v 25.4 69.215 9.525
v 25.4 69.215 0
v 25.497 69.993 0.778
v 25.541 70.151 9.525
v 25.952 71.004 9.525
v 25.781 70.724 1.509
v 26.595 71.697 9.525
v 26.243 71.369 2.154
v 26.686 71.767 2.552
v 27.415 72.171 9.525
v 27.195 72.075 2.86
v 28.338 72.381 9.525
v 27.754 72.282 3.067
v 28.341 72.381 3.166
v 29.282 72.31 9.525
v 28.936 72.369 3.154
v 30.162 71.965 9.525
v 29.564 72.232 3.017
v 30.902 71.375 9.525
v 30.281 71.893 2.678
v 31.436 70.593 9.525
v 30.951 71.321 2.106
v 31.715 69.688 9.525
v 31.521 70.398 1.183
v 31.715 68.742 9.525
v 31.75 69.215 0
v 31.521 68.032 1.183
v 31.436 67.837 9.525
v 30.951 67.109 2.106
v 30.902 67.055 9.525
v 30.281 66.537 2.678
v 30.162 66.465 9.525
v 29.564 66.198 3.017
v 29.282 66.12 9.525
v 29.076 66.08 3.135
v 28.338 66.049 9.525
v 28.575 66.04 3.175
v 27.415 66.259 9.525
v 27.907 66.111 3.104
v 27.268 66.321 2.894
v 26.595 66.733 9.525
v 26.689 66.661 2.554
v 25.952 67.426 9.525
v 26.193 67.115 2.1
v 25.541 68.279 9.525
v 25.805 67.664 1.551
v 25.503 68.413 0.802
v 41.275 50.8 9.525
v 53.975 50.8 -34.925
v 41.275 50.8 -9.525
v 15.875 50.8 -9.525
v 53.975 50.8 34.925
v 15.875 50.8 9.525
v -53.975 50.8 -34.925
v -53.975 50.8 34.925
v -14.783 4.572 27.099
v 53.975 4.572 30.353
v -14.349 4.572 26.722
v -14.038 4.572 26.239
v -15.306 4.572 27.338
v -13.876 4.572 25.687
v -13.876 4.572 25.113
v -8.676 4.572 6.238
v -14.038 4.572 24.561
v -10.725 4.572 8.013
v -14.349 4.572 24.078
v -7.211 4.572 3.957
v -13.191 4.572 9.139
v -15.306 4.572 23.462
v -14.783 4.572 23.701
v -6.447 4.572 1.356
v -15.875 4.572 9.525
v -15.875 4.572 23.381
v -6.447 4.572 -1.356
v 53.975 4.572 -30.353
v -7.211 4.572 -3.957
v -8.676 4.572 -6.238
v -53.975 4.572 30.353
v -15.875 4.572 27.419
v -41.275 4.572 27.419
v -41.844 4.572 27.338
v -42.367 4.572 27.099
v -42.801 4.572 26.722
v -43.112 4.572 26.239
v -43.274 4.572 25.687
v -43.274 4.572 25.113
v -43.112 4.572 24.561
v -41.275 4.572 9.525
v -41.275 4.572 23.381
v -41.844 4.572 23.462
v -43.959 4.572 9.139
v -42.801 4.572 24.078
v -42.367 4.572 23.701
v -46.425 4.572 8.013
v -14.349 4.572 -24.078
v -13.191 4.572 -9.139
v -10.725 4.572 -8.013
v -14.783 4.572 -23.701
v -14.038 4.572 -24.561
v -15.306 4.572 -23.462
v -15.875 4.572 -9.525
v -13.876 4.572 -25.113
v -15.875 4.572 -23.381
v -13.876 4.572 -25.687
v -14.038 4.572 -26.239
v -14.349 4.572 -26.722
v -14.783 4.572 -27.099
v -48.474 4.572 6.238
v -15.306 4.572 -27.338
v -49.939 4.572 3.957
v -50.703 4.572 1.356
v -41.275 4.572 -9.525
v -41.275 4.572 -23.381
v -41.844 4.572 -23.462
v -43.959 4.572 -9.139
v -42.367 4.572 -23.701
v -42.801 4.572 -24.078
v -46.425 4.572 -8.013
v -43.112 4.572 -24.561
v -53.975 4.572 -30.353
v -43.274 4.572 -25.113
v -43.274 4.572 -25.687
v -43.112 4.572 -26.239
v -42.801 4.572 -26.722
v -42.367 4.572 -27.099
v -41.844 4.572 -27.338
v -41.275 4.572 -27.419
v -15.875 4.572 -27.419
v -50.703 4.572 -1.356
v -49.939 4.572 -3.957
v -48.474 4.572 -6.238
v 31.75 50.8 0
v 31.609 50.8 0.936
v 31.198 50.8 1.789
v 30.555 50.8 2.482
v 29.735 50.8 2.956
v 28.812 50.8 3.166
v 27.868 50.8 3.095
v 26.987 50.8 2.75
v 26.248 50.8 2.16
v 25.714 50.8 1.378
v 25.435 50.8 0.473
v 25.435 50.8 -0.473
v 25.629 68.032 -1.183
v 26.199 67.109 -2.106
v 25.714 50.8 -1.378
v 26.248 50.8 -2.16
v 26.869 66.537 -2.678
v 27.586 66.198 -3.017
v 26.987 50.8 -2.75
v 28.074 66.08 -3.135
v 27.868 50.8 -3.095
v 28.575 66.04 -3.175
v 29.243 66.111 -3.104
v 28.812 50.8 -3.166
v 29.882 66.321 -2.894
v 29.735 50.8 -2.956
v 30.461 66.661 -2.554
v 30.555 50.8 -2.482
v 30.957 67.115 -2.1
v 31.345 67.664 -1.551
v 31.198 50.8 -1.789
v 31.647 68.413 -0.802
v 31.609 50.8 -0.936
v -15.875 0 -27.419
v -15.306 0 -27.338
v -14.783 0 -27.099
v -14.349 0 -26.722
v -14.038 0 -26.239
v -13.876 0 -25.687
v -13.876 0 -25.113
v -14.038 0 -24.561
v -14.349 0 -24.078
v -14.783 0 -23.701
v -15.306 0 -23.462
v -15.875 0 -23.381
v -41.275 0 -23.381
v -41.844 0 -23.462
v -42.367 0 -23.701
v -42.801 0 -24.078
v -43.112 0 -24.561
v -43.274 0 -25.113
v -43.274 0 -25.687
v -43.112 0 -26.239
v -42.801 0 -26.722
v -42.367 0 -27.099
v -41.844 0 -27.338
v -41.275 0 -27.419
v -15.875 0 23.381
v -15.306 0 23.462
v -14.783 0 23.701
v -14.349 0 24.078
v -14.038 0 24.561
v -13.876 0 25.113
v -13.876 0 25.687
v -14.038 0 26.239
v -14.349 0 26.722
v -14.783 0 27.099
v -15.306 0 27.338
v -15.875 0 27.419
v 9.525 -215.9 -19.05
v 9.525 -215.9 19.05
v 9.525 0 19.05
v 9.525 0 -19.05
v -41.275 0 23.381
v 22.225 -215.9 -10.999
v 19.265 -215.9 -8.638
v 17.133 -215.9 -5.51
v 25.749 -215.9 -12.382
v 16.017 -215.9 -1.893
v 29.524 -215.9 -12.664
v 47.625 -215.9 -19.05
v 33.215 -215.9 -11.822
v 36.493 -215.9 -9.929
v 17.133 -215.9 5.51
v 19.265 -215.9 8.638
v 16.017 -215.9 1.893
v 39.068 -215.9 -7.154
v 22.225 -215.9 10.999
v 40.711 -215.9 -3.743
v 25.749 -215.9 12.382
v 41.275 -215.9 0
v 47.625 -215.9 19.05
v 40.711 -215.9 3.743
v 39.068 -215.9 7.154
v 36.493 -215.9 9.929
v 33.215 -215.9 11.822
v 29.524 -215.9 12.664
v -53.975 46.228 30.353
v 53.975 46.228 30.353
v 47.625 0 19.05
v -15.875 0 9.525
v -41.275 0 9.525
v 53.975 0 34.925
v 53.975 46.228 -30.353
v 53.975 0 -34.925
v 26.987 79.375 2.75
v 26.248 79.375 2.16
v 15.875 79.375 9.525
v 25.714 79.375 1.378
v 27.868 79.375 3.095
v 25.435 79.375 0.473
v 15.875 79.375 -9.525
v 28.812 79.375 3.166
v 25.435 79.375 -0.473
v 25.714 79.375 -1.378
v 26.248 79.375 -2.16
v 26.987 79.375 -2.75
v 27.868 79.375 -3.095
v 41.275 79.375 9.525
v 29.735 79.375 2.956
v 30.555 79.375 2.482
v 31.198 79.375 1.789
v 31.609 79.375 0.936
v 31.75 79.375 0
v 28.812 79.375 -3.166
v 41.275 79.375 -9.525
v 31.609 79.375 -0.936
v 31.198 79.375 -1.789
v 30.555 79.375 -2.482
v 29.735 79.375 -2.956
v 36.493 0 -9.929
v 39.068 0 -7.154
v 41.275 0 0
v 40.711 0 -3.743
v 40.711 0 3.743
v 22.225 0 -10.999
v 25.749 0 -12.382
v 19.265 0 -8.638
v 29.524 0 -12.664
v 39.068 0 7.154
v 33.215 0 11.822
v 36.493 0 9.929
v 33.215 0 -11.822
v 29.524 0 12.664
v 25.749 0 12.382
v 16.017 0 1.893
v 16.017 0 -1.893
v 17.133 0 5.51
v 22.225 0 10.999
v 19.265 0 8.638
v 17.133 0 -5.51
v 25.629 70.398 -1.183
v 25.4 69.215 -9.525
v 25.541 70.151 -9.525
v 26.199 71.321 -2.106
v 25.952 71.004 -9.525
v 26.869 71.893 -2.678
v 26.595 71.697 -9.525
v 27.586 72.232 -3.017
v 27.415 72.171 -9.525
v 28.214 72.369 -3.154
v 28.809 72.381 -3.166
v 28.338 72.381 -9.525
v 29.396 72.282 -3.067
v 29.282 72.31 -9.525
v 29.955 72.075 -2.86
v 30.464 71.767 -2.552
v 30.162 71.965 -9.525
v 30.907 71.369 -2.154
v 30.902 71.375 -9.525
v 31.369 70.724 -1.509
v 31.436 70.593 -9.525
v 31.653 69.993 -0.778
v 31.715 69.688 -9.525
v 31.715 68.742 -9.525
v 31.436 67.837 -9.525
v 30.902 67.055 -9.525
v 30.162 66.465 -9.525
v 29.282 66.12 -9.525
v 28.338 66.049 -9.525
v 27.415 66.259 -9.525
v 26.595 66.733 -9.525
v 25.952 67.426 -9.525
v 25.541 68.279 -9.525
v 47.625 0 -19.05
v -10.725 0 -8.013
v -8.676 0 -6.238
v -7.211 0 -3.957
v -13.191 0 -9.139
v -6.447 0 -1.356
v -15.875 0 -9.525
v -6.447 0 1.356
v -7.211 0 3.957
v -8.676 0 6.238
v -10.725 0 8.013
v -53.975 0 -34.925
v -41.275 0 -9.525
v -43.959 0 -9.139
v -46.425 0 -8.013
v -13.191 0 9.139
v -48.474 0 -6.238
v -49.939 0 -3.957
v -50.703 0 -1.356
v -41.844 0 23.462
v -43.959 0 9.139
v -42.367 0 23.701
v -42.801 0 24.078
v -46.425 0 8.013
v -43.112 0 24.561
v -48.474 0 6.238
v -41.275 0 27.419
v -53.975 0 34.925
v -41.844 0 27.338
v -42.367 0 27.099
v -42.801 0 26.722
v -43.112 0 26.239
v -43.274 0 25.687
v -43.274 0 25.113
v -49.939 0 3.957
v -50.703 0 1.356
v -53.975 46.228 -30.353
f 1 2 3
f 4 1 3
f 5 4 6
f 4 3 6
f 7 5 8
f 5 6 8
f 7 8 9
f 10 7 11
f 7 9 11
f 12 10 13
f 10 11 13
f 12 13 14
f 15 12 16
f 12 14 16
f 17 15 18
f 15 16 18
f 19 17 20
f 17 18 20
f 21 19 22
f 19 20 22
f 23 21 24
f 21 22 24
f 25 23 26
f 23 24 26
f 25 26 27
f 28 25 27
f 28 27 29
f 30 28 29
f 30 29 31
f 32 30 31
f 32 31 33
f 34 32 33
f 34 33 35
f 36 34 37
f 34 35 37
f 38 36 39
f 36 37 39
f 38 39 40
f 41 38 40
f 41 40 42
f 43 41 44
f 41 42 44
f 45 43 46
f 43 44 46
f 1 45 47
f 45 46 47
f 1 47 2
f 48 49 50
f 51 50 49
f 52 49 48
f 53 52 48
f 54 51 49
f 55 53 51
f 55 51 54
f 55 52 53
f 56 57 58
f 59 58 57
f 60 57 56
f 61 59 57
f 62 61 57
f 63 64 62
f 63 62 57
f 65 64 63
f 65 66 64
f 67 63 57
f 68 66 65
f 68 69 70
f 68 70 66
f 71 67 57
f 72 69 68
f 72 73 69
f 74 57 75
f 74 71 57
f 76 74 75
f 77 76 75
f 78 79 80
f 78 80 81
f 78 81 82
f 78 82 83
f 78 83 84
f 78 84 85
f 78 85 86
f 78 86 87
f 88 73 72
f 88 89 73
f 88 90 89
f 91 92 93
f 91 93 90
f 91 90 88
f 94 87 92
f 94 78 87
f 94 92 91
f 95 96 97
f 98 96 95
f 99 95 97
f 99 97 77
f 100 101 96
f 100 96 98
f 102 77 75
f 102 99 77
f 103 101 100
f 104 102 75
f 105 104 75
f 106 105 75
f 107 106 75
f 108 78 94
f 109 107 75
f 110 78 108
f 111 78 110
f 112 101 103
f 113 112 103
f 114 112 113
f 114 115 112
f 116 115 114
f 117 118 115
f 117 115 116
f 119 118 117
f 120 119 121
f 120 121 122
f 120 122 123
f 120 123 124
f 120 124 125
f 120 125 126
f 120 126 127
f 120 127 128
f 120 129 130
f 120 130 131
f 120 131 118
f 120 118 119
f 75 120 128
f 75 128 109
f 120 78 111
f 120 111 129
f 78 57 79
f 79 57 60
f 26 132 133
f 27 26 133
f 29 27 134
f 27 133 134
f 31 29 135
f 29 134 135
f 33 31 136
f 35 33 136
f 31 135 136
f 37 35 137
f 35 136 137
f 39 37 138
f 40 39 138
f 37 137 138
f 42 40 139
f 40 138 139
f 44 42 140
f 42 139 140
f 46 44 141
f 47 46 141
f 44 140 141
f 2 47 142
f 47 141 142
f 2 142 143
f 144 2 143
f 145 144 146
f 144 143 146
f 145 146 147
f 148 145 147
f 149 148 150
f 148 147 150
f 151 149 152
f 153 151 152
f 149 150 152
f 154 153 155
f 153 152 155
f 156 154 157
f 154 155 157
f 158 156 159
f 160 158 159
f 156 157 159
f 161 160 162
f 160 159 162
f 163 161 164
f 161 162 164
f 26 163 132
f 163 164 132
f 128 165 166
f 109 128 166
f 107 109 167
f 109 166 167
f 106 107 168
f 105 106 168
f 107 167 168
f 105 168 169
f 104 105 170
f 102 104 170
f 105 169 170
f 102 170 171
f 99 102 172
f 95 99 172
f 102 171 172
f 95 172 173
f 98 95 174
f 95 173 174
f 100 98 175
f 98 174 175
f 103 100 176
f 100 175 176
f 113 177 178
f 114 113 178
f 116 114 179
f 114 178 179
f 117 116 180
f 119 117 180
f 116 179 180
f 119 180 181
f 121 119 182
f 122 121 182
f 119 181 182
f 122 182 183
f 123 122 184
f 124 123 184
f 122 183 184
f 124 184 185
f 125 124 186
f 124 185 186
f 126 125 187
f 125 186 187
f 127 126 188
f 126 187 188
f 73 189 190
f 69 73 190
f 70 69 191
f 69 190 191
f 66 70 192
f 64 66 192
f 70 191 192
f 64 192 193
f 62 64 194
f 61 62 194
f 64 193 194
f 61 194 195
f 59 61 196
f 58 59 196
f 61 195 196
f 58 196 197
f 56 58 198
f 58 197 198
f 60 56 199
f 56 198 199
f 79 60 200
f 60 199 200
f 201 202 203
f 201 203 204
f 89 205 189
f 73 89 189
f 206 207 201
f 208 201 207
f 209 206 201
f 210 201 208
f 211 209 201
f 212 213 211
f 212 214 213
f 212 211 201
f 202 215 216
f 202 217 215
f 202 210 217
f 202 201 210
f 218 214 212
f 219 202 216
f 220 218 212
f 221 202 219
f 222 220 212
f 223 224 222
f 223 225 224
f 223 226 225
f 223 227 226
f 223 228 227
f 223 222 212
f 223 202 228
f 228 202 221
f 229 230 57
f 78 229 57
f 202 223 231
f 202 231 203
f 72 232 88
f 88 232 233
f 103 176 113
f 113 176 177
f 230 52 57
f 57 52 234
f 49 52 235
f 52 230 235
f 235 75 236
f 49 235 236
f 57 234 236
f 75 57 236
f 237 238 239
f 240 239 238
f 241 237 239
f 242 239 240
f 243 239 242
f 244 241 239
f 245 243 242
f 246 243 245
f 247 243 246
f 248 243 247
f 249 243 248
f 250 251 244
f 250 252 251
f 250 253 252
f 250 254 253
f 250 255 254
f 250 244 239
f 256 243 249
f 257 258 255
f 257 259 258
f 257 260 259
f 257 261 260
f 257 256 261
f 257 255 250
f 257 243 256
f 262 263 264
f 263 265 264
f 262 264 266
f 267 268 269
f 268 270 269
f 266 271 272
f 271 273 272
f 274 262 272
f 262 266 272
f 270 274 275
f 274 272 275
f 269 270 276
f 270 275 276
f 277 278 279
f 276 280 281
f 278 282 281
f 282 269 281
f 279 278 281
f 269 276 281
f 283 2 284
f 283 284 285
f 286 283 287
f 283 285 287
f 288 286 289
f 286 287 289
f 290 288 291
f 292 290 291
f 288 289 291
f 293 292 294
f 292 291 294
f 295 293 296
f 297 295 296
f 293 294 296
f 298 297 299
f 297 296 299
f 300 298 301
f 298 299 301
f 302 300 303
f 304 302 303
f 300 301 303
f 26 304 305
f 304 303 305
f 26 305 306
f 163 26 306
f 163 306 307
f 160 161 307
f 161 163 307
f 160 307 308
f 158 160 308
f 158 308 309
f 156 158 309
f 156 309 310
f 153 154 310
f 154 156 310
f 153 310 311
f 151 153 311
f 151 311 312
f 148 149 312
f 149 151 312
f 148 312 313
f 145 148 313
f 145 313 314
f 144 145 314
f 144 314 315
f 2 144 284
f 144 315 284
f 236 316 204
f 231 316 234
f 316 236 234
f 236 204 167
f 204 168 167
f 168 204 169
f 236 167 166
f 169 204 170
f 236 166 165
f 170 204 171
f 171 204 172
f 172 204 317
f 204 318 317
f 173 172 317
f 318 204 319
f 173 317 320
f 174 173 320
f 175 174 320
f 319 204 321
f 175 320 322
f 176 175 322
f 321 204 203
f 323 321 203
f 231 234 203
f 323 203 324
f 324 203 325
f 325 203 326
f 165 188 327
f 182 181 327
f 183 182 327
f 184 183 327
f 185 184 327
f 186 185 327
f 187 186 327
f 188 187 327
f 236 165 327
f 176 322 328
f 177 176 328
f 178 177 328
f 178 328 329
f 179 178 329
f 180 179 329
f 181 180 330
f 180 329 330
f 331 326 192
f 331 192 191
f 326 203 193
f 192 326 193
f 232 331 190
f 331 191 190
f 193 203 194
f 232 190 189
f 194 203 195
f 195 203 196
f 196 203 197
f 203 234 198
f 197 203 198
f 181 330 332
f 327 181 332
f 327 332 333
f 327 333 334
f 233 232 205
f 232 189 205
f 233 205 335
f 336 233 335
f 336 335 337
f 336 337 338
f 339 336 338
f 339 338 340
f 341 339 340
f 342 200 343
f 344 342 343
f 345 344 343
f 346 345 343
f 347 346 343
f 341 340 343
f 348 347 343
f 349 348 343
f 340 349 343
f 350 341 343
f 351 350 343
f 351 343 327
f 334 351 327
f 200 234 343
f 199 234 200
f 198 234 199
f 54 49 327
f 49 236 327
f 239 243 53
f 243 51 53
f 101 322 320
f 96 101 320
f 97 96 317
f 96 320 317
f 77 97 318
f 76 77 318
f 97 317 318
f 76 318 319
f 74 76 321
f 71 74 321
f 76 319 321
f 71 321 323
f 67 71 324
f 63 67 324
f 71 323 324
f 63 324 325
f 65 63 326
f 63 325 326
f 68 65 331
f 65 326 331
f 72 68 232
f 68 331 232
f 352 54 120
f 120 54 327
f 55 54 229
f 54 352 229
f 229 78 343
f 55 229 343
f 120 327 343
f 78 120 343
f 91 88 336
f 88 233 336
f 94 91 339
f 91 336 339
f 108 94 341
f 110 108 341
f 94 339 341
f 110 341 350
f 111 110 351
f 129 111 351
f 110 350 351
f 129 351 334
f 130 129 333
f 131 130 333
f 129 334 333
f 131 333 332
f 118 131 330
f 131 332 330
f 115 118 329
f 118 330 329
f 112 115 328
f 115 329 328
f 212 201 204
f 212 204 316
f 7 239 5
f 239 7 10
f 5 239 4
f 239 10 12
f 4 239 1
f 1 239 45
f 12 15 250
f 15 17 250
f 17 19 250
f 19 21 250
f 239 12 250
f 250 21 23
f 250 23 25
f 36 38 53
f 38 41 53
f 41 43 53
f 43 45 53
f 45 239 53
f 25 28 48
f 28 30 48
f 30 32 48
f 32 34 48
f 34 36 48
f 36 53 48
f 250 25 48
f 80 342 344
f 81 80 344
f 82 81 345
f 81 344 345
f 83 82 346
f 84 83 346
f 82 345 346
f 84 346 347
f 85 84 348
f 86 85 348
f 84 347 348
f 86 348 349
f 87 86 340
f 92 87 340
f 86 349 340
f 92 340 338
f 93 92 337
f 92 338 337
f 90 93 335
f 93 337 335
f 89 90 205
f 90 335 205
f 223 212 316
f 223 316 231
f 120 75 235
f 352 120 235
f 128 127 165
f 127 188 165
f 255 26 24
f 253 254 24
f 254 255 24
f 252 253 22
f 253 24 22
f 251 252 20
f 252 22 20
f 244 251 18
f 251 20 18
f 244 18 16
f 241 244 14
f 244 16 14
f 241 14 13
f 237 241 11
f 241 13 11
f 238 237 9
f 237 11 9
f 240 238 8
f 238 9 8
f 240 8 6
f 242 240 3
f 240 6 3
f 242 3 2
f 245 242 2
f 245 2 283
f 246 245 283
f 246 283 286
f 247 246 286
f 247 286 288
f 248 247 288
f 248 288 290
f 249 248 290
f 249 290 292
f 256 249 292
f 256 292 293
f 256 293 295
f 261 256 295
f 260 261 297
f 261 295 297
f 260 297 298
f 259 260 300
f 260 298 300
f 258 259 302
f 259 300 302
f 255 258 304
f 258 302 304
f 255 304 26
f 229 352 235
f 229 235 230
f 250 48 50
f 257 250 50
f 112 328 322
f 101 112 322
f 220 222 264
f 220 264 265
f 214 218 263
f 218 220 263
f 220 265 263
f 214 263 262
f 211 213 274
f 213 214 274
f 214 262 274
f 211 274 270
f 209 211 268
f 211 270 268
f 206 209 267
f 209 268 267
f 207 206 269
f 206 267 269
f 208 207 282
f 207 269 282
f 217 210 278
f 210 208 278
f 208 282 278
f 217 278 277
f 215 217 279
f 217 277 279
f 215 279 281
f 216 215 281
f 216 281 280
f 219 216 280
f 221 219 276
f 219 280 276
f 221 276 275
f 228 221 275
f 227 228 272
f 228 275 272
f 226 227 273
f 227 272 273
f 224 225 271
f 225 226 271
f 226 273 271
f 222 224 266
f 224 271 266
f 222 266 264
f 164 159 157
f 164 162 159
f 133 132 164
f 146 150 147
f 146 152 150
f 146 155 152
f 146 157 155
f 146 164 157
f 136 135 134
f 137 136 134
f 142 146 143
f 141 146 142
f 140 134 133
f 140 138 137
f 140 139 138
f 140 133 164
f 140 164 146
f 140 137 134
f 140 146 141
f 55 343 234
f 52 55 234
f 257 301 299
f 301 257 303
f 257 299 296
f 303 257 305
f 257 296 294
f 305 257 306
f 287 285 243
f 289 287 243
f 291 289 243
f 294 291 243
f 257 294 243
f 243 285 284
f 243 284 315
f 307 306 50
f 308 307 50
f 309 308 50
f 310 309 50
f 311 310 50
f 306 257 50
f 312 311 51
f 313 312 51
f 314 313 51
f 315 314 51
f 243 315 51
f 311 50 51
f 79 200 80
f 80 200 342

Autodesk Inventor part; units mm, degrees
ref_plane "YZ Plane" through (0, 0, 0) normal (1, 0, 0) x (0, 1, 0)
ref_plane "XZ Plane" through (0, 0, 0) normal (0, 1, 0) x (-1, 0, 0)
ref_plane "XY Plane" through (0, 0, 0) normal (0, 0, 1) x (1, 0, 0)
sketch "Sketch1" plane through (0, 0, 0) normal (0, 1, 0) x (-1, 0, 0)
  line L0 (53.975, 34.925) -> (-53.975, 34.925)
  line L1 (-53.975, 34.925) -> (-53.975, -34.925)
  line L2 (-53.975, -34.925) -> (53.975, -34.925)
  line L3 (53.975, -34.925) -> (53.975, 34.925)
  line L4 (0, -48.895) -> (0, 48.895) projected
  line L5 (-75.565, 0) -> (75.565, 0) projected
  point P0 (0, 0)
  dimension "d0" = 69.85
  dimension "d1" = 107.95
extrude "Extrusion1" add sketch "Sketch1" along normal blind 50.8
sketch "Sketch2" plane through (0, 50.8, 0) normal (0, 1, 0) x (1, 0, 0)
  line L0 (-53.975, -34.925) -> (53.975, -34.925) projected
  line L1 (53.975, -34.925) -> (53.975, 34.925) projected
  line L2 (53.975, 34.925) -> (-53.975, 34.925) projected
  line L3 (-53.975, 34.925) -> (-53.975, -34.925) projected
  line L4 (15.875, -9.525) -> (41.275, -9.525)
  line L5 (41.275, -9.525) -> (41.275, 9.525)
  line L6 (41.275, 9.525) -> (15.875, 9.525)
  line L7 (15.875, 9.525) -> (15.875, -9.525)
  line L8 (75.565, 0) -> (-75.565, 0) projected
  circle A0 centre (28.575, 0) radius 3.175
  line L9 (28.575, -9.525) -> (28.575, 9.525) construction
  point P0 (0, 0)
  dimension "d4" = 25.4
  dimension "d5" = 19.05
  dimension "d7" = 6.35
  dimension "d29" = 12.7
extrude "Extrusion2" add sketch "Sketch2" along normal blind 28.575 contours L8 A0 L5 L4 L7 | L7 L6 L5 L8 A0
sketch "Sketch3" plane through (-53.975, 0, -34.925) normal (-1, 0, 0) x (0, 0, 1)
  line L0 (0, 0) -> (69.85, 0) projected
  line L1 (69.85, 0) -> (69.85, 50.8) projected
  line L2 (0, 50.8) -> (69.85, 50.8) projected
  line L3 (0, 0) -> (0, 50.8) projected
  line L4 (65.278, 4.572) -> (4.572, 4.572)
  line L5 (4.572, 4.572) -> (4.572, 46.228)
  line L6 (4.572, 46.228) -> (65.278, 46.228)
  line L7 (65.278, 46.228) -> (65.278, 4.572)
  point P0 (34.925, 0)
  dimension "d10" = 4.572
extrude "Extrusion3" cut sketch "Sketch3" against normal up to next contours L4 L5 L6 L7
sketch "Sketch4" plane through (0, 0, 0) normal (0, -1, 0) x (1, 0, 0)
  line L0 (-53.975, 34.925) -> (53.975, 34.925) projected
  line L1 (-53.975, -34.925) -> (-53.975, 34.925) projected
  line L2 (53.975, -34.925) -> (-53.975, -34.925) projected
  line L3 (53.975, 34.925) -> (53.975, -34.925) projected
  line L4 (9.525, -19.05) -> (47.625, -19.05)
  line L5 (47.625, -19.05) -> (47.625, 19.05)
  line L6 (47.625, 19.05) -> (9.525, 19.05)
  line L7 (9.525, 19.05) -> (9.525, -19.05)
  line L8 (-79.233, 0) -> (97.5728, 0) construction
  arc A0 (-41.275, 9.525) -> (-41.275, -9.525) centre (-41.275, 0) ccw
  arc A1 (-15.875, -9.525) -> (-15.875, 9.525) centre (-15.875, 0) ccw
  arc A2 (-41.275, -23.3807) -> (-41.275, -27.4193) centre (-41.275, -25.4) ccw
  arc A3 (-15.875, -27.4193) -> (-15.875, -23.3807) centre (-15.875, -25.4) ccw
  arc A4 (-41.275, 27.4193) -> (-41.275, 23.3807) centre (-41.275, 25.4) ccw
  arc A5 (-15.875, 23.3807) -> (-15.875, 27.4193) centre (-15.875, 25.4) ccw
  line L9 (-28.575, -34.925) -> (-28.575, 34.925) construction
  line L10 (-41.275, -25.4) -> (-41.275, 25.4) construction
  line L11 (-41.275, -27.4193) -> (-15.875, -27.4193)
  line L12 (-15.875, -23.3807) -> (-41.275, -23.3807)
  line L13 (-41.275, 23.3807) -> (-15.875, 23.3807)
  line L14 (-15.875, 27.4193) -> (-41.275, 27.4193)
  line L15 (-41.275, -9.525) -> (-15.875, -9.525)
  line L16 (-15.875, 9.525) -> (-41.275, 9.525)
  circle A6 centre (28.575, 0) radius 12.7
  line L17 (28.575, 19.05) -> (28.575, -19.05) construction
  point P0 (0, 0)
  dimension "d13" = 38.1
  dimension "d14" = 6.35
  dimension "d15" = 4.0386
  dimension "d16" = 25.4
  dimension "d17" = 25.4
  dimension "d18" = 12.7
  dimension "d19" = 19.05
  dimension "d22" = 25.4
extrude "Extrusion4" cut sketch "Sketch4" against normal up to surface (4.572 mm away) contours L16 A1 L15 A0 | L12 A3 L11 A2 | L14 A5 L13 A4
extrude "Extrusion5" add sketch "Sketch4" along normal blind 215.9 contours L7 L6 L5 L4
sketch "Sketch5" plane through (41.275, 50.8, -9.525) normal (0, 0, -1) x (-1, 0, 0)
  line L0 (25.4, 0) -> (0, 0) projected
  line L1 (25.4, 0) -> (25.4, 28.575) projected
  line L2 (0, 28.575) -> (25.4, 28.575) projected
  line L3 (0, 0) -> (0, 28.575) projected
  circle A0 centre (12.7, 18.415) radius 3.175
  line L4 (25.4, 28.575) -> (0, 28.575) construction
  line L5 (12.7, 28.575) -> (12.7, 0) construction
  point P0 (41.275, -50.8)
  dimension "d25" = 6.35
  dimension "d26" = 10.16
extrude "Extrusion6" cut sketch "Sketch5" against normal up to surface (19.05 mm away) contours A0
properties part number "DART Actuator"
